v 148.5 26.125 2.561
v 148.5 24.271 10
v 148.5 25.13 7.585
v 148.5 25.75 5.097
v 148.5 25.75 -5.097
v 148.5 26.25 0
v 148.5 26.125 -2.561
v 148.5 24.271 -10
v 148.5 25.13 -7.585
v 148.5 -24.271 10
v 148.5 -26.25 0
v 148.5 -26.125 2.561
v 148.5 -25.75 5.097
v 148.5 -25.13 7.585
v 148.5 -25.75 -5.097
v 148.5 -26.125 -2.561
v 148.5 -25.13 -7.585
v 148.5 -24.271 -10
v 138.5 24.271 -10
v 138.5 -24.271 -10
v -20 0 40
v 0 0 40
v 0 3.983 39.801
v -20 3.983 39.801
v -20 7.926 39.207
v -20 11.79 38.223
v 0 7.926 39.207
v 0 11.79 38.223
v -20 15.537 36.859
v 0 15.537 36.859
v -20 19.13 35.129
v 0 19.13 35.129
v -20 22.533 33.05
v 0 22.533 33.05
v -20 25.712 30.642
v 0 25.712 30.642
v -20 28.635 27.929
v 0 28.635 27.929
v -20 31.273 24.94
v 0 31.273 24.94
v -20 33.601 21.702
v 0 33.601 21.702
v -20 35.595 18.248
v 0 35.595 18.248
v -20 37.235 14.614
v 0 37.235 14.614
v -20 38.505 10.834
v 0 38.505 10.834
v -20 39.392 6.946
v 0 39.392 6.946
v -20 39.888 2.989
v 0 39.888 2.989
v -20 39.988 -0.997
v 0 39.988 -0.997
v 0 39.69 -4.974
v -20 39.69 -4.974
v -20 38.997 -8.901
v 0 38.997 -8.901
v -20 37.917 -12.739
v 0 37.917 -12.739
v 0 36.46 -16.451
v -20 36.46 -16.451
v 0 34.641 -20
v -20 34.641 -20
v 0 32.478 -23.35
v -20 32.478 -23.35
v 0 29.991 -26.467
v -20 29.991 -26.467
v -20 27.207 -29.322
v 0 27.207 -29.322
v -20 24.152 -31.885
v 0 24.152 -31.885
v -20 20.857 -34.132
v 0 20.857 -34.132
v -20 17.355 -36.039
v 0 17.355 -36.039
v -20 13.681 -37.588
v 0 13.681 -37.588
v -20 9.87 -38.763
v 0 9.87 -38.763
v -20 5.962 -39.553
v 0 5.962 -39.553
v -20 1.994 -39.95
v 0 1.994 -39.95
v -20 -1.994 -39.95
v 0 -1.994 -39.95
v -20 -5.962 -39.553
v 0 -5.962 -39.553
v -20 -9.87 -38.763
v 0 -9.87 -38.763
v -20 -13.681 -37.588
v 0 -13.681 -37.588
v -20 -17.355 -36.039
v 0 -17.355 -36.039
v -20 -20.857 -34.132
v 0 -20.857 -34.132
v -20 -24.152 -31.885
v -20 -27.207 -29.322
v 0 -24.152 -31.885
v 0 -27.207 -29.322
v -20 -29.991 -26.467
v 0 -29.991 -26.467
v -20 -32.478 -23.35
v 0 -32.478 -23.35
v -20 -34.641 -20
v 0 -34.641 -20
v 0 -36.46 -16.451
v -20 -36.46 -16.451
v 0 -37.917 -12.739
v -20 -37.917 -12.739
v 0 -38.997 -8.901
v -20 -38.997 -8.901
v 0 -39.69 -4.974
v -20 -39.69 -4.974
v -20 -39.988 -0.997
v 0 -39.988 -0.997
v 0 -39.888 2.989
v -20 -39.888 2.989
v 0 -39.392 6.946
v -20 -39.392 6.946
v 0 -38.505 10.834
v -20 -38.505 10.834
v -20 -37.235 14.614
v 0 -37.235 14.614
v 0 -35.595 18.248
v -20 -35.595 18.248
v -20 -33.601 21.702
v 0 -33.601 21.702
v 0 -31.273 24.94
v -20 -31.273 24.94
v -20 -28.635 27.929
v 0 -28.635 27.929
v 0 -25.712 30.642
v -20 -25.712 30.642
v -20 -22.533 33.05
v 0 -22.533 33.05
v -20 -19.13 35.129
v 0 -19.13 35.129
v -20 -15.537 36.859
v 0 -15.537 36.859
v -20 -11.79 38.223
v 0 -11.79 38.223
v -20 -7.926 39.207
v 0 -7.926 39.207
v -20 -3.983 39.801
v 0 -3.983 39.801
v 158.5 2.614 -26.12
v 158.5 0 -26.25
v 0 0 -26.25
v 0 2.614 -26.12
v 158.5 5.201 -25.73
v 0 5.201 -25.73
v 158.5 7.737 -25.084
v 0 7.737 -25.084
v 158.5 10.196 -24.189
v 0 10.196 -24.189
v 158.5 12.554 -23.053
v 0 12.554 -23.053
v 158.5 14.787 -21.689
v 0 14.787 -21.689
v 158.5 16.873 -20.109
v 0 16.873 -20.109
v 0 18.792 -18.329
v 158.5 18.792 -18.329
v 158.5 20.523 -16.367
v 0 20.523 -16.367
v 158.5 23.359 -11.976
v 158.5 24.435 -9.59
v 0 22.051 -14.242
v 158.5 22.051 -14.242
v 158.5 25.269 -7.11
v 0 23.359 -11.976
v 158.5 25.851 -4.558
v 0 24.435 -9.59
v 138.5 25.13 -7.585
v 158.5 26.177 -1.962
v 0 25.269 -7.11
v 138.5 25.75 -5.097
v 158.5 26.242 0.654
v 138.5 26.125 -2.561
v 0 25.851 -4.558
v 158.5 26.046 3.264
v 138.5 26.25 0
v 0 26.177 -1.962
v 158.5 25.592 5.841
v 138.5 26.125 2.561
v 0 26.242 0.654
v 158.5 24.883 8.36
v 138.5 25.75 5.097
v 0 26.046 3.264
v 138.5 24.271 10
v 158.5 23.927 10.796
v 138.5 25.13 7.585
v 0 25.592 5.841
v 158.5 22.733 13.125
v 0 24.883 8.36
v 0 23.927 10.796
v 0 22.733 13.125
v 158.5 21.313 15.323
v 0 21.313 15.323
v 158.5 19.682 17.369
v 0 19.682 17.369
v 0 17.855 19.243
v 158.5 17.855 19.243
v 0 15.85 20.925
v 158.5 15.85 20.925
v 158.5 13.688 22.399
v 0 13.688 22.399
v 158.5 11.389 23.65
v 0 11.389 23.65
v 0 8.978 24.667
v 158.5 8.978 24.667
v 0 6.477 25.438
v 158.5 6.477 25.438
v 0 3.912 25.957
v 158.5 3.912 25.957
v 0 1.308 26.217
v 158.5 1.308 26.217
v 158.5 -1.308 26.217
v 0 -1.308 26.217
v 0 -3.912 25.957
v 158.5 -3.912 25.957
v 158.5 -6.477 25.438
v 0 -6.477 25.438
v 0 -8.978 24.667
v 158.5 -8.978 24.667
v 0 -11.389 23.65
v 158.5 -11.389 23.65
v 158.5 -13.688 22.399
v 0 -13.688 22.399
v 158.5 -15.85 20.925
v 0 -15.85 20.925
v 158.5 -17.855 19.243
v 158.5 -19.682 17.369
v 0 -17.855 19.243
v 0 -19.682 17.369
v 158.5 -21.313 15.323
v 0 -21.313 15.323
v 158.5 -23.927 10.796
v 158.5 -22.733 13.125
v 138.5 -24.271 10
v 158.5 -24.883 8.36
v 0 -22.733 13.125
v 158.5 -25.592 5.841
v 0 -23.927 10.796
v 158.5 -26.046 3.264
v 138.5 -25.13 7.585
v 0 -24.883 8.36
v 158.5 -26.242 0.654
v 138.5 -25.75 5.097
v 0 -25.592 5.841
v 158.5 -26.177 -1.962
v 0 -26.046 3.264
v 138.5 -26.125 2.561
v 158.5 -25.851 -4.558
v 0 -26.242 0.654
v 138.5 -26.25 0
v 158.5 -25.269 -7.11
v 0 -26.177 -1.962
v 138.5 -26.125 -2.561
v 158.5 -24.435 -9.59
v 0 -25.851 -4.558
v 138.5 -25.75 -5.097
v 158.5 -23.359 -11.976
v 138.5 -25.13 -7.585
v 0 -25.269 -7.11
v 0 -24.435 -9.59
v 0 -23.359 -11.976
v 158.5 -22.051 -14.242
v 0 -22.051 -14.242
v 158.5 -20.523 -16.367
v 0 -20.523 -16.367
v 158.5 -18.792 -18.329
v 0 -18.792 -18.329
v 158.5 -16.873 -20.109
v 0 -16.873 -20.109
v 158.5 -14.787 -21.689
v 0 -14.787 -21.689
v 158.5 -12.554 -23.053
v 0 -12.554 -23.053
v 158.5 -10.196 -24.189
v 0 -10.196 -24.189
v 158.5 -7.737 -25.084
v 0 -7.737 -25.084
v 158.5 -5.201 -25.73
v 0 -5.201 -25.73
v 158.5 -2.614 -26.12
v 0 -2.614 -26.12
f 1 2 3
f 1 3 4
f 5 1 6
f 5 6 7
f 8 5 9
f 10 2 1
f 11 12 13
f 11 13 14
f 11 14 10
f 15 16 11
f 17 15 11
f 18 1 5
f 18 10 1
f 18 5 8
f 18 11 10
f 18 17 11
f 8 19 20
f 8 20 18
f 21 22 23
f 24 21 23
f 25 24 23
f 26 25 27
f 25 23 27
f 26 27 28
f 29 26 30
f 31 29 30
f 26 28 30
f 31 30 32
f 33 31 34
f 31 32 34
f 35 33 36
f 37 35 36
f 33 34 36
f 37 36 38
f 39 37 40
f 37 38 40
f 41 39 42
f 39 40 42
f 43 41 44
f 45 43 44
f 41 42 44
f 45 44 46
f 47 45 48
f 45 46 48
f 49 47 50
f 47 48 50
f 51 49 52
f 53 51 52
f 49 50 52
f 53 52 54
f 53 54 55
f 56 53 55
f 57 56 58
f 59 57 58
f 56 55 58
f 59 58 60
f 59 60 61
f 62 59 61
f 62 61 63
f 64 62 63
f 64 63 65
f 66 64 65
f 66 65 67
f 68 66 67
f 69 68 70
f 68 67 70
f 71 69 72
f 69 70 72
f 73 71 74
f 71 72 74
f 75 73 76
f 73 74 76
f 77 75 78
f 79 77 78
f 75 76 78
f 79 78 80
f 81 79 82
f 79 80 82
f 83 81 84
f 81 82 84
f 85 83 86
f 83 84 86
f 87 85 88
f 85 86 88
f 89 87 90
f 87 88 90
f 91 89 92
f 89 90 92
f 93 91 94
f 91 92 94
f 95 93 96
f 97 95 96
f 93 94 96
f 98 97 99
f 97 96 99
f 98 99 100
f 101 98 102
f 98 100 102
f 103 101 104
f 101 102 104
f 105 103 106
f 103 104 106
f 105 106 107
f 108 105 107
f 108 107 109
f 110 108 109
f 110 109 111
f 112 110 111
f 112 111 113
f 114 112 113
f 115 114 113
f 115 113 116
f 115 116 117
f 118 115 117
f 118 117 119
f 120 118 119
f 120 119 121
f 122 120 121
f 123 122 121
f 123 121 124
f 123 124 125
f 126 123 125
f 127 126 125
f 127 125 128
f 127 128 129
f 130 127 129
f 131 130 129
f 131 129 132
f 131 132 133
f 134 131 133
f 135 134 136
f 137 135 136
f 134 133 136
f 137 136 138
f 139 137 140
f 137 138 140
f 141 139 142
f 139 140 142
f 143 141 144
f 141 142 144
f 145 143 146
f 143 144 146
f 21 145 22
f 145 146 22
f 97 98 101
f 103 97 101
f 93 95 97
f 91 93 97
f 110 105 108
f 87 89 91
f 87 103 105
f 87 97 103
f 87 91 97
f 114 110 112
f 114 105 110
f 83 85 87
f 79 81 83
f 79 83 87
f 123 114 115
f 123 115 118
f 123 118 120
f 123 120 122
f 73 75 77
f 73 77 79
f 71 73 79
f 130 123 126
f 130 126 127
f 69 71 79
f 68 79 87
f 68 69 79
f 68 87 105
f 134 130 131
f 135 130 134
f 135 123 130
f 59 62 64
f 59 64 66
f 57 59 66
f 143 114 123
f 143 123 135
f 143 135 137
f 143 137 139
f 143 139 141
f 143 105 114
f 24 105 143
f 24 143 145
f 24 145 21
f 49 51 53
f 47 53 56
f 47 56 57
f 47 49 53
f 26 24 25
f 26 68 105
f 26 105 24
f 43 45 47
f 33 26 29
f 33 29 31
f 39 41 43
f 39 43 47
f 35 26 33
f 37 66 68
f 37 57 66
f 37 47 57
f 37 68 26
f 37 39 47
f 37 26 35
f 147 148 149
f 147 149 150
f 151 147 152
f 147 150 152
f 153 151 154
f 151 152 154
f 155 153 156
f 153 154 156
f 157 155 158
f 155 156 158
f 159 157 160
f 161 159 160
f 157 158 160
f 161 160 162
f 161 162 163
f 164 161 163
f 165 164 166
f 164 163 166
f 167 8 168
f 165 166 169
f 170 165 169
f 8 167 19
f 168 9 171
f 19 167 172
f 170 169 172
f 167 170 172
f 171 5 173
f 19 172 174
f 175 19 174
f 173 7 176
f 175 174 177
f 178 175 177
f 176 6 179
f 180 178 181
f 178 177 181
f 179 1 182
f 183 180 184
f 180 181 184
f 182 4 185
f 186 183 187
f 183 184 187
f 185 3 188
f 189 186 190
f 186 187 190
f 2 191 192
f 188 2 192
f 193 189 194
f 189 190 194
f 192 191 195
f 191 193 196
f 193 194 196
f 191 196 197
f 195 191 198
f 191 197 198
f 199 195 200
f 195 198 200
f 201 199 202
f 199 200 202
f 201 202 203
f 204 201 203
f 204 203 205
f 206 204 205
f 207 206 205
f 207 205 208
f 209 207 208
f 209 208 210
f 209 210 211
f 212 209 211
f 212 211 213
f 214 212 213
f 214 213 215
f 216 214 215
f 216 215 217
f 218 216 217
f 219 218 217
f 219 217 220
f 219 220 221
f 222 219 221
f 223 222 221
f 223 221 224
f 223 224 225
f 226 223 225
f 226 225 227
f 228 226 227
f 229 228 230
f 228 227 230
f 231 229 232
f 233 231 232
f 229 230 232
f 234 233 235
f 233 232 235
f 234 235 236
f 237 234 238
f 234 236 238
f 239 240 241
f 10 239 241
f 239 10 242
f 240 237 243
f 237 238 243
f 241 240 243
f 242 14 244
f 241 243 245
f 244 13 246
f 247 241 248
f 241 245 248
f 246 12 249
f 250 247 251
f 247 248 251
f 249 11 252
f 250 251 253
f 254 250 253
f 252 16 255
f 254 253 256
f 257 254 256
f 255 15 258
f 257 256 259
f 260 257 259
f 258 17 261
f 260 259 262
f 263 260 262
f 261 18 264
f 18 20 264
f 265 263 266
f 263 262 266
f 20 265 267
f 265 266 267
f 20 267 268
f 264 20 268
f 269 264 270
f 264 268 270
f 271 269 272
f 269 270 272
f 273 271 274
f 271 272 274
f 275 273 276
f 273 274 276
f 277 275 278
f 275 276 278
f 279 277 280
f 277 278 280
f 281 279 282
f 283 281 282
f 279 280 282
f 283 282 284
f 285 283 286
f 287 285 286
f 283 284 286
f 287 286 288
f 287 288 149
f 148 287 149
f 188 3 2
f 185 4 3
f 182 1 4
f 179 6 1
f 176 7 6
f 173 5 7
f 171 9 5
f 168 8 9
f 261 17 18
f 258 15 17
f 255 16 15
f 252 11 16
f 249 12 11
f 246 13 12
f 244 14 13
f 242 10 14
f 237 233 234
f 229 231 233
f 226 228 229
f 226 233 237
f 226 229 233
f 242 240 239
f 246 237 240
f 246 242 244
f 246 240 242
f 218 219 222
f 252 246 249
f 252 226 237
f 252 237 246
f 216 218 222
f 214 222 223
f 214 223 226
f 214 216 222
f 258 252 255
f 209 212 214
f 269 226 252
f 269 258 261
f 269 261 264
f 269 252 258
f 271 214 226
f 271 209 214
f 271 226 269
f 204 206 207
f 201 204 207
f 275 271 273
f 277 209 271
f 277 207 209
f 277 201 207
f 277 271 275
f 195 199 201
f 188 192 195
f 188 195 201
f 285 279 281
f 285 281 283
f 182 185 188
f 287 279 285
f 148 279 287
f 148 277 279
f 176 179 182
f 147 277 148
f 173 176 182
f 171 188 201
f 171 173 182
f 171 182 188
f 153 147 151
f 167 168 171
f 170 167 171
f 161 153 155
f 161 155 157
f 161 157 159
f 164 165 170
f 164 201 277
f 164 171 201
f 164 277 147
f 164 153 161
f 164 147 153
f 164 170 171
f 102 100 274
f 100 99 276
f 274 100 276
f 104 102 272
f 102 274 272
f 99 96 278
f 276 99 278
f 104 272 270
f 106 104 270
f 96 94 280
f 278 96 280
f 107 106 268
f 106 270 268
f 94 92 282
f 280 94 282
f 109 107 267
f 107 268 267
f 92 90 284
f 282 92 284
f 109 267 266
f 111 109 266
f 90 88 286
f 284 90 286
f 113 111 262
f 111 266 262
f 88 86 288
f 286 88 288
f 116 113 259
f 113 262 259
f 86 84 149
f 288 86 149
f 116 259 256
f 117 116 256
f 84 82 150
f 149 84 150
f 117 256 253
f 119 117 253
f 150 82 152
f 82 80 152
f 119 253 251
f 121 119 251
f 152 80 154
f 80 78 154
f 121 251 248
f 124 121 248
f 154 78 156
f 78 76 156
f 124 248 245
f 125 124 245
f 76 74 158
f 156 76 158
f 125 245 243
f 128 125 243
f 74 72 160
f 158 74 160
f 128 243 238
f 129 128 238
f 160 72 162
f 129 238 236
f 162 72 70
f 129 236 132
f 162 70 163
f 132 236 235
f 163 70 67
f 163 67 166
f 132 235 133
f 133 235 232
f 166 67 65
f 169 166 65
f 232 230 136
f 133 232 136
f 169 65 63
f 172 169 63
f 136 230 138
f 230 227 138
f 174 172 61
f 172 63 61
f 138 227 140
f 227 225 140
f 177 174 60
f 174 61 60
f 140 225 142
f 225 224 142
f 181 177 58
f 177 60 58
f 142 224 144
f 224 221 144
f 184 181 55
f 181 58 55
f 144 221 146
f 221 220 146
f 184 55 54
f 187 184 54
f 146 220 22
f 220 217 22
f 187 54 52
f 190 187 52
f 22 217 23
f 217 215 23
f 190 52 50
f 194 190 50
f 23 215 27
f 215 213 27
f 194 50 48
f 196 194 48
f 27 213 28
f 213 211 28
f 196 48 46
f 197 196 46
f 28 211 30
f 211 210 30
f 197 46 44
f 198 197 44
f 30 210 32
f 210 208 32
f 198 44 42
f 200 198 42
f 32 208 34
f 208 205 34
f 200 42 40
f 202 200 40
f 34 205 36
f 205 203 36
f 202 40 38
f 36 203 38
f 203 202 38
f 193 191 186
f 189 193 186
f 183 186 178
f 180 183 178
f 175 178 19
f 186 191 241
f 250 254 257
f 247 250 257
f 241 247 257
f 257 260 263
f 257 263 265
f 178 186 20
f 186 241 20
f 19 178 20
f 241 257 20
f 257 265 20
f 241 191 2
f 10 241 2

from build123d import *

# Parameters (mm, degrees)
SKETCH1_R               = 26.25
BOSS_EXTRUDE1_DEPTH     = 158.5
SKETCH2_R               = 40
BOSS_EXTRUDE2_DEPTH     = 20
CUT_EXTRUDE1_DEPTH      = 169.29215668
CUT_EXTRUDE1_DEPTH_BACK = 169.29215668
SKETCH3_W               = 10
SKETCH3_H               = 20


with BuildPart() as part:
    # Sketch1 → Boss-Extrude1 (new body)
    with BuildSketch(Plane(origin=(0, 0, 0), x_dir=(0, 0, -1), z_dir=(1, 0, 0))):
        Circle(SKETCH1_R)
    extrude(amount=BOSS_EXTRUDE1_DEPTH)

    # Sketch2 → Boss-Extrude2 (add)
    with BuildSketch(Plane.ZY):
        Circle(SKETCH2_R)
    extrude(amount=BOSS_EXTRUDE2_DEPTH)

    # Sketch3 → Cut-Extrude1 (cut, two sides: drawn at the far end of the back side and taken through both)
    with BuildSketch(Plane(origin=(0, 0, 0), x_dir=(1, 0, 0), z_dir=(0, 1, 0)).offset(-CUT_EXTRUDE1_DEPTH_BACK)):
        with Locations((143.5, 0)):
            Rectangle(SKETCH3_W, SKETCH3_H)
    extrude(amount=CUT_EXTRUDE1_DEPTH + CUT_EXTRUDE1_DEPTH_BACK, mode=Mode.SUBTRACT)


solid = part.part
